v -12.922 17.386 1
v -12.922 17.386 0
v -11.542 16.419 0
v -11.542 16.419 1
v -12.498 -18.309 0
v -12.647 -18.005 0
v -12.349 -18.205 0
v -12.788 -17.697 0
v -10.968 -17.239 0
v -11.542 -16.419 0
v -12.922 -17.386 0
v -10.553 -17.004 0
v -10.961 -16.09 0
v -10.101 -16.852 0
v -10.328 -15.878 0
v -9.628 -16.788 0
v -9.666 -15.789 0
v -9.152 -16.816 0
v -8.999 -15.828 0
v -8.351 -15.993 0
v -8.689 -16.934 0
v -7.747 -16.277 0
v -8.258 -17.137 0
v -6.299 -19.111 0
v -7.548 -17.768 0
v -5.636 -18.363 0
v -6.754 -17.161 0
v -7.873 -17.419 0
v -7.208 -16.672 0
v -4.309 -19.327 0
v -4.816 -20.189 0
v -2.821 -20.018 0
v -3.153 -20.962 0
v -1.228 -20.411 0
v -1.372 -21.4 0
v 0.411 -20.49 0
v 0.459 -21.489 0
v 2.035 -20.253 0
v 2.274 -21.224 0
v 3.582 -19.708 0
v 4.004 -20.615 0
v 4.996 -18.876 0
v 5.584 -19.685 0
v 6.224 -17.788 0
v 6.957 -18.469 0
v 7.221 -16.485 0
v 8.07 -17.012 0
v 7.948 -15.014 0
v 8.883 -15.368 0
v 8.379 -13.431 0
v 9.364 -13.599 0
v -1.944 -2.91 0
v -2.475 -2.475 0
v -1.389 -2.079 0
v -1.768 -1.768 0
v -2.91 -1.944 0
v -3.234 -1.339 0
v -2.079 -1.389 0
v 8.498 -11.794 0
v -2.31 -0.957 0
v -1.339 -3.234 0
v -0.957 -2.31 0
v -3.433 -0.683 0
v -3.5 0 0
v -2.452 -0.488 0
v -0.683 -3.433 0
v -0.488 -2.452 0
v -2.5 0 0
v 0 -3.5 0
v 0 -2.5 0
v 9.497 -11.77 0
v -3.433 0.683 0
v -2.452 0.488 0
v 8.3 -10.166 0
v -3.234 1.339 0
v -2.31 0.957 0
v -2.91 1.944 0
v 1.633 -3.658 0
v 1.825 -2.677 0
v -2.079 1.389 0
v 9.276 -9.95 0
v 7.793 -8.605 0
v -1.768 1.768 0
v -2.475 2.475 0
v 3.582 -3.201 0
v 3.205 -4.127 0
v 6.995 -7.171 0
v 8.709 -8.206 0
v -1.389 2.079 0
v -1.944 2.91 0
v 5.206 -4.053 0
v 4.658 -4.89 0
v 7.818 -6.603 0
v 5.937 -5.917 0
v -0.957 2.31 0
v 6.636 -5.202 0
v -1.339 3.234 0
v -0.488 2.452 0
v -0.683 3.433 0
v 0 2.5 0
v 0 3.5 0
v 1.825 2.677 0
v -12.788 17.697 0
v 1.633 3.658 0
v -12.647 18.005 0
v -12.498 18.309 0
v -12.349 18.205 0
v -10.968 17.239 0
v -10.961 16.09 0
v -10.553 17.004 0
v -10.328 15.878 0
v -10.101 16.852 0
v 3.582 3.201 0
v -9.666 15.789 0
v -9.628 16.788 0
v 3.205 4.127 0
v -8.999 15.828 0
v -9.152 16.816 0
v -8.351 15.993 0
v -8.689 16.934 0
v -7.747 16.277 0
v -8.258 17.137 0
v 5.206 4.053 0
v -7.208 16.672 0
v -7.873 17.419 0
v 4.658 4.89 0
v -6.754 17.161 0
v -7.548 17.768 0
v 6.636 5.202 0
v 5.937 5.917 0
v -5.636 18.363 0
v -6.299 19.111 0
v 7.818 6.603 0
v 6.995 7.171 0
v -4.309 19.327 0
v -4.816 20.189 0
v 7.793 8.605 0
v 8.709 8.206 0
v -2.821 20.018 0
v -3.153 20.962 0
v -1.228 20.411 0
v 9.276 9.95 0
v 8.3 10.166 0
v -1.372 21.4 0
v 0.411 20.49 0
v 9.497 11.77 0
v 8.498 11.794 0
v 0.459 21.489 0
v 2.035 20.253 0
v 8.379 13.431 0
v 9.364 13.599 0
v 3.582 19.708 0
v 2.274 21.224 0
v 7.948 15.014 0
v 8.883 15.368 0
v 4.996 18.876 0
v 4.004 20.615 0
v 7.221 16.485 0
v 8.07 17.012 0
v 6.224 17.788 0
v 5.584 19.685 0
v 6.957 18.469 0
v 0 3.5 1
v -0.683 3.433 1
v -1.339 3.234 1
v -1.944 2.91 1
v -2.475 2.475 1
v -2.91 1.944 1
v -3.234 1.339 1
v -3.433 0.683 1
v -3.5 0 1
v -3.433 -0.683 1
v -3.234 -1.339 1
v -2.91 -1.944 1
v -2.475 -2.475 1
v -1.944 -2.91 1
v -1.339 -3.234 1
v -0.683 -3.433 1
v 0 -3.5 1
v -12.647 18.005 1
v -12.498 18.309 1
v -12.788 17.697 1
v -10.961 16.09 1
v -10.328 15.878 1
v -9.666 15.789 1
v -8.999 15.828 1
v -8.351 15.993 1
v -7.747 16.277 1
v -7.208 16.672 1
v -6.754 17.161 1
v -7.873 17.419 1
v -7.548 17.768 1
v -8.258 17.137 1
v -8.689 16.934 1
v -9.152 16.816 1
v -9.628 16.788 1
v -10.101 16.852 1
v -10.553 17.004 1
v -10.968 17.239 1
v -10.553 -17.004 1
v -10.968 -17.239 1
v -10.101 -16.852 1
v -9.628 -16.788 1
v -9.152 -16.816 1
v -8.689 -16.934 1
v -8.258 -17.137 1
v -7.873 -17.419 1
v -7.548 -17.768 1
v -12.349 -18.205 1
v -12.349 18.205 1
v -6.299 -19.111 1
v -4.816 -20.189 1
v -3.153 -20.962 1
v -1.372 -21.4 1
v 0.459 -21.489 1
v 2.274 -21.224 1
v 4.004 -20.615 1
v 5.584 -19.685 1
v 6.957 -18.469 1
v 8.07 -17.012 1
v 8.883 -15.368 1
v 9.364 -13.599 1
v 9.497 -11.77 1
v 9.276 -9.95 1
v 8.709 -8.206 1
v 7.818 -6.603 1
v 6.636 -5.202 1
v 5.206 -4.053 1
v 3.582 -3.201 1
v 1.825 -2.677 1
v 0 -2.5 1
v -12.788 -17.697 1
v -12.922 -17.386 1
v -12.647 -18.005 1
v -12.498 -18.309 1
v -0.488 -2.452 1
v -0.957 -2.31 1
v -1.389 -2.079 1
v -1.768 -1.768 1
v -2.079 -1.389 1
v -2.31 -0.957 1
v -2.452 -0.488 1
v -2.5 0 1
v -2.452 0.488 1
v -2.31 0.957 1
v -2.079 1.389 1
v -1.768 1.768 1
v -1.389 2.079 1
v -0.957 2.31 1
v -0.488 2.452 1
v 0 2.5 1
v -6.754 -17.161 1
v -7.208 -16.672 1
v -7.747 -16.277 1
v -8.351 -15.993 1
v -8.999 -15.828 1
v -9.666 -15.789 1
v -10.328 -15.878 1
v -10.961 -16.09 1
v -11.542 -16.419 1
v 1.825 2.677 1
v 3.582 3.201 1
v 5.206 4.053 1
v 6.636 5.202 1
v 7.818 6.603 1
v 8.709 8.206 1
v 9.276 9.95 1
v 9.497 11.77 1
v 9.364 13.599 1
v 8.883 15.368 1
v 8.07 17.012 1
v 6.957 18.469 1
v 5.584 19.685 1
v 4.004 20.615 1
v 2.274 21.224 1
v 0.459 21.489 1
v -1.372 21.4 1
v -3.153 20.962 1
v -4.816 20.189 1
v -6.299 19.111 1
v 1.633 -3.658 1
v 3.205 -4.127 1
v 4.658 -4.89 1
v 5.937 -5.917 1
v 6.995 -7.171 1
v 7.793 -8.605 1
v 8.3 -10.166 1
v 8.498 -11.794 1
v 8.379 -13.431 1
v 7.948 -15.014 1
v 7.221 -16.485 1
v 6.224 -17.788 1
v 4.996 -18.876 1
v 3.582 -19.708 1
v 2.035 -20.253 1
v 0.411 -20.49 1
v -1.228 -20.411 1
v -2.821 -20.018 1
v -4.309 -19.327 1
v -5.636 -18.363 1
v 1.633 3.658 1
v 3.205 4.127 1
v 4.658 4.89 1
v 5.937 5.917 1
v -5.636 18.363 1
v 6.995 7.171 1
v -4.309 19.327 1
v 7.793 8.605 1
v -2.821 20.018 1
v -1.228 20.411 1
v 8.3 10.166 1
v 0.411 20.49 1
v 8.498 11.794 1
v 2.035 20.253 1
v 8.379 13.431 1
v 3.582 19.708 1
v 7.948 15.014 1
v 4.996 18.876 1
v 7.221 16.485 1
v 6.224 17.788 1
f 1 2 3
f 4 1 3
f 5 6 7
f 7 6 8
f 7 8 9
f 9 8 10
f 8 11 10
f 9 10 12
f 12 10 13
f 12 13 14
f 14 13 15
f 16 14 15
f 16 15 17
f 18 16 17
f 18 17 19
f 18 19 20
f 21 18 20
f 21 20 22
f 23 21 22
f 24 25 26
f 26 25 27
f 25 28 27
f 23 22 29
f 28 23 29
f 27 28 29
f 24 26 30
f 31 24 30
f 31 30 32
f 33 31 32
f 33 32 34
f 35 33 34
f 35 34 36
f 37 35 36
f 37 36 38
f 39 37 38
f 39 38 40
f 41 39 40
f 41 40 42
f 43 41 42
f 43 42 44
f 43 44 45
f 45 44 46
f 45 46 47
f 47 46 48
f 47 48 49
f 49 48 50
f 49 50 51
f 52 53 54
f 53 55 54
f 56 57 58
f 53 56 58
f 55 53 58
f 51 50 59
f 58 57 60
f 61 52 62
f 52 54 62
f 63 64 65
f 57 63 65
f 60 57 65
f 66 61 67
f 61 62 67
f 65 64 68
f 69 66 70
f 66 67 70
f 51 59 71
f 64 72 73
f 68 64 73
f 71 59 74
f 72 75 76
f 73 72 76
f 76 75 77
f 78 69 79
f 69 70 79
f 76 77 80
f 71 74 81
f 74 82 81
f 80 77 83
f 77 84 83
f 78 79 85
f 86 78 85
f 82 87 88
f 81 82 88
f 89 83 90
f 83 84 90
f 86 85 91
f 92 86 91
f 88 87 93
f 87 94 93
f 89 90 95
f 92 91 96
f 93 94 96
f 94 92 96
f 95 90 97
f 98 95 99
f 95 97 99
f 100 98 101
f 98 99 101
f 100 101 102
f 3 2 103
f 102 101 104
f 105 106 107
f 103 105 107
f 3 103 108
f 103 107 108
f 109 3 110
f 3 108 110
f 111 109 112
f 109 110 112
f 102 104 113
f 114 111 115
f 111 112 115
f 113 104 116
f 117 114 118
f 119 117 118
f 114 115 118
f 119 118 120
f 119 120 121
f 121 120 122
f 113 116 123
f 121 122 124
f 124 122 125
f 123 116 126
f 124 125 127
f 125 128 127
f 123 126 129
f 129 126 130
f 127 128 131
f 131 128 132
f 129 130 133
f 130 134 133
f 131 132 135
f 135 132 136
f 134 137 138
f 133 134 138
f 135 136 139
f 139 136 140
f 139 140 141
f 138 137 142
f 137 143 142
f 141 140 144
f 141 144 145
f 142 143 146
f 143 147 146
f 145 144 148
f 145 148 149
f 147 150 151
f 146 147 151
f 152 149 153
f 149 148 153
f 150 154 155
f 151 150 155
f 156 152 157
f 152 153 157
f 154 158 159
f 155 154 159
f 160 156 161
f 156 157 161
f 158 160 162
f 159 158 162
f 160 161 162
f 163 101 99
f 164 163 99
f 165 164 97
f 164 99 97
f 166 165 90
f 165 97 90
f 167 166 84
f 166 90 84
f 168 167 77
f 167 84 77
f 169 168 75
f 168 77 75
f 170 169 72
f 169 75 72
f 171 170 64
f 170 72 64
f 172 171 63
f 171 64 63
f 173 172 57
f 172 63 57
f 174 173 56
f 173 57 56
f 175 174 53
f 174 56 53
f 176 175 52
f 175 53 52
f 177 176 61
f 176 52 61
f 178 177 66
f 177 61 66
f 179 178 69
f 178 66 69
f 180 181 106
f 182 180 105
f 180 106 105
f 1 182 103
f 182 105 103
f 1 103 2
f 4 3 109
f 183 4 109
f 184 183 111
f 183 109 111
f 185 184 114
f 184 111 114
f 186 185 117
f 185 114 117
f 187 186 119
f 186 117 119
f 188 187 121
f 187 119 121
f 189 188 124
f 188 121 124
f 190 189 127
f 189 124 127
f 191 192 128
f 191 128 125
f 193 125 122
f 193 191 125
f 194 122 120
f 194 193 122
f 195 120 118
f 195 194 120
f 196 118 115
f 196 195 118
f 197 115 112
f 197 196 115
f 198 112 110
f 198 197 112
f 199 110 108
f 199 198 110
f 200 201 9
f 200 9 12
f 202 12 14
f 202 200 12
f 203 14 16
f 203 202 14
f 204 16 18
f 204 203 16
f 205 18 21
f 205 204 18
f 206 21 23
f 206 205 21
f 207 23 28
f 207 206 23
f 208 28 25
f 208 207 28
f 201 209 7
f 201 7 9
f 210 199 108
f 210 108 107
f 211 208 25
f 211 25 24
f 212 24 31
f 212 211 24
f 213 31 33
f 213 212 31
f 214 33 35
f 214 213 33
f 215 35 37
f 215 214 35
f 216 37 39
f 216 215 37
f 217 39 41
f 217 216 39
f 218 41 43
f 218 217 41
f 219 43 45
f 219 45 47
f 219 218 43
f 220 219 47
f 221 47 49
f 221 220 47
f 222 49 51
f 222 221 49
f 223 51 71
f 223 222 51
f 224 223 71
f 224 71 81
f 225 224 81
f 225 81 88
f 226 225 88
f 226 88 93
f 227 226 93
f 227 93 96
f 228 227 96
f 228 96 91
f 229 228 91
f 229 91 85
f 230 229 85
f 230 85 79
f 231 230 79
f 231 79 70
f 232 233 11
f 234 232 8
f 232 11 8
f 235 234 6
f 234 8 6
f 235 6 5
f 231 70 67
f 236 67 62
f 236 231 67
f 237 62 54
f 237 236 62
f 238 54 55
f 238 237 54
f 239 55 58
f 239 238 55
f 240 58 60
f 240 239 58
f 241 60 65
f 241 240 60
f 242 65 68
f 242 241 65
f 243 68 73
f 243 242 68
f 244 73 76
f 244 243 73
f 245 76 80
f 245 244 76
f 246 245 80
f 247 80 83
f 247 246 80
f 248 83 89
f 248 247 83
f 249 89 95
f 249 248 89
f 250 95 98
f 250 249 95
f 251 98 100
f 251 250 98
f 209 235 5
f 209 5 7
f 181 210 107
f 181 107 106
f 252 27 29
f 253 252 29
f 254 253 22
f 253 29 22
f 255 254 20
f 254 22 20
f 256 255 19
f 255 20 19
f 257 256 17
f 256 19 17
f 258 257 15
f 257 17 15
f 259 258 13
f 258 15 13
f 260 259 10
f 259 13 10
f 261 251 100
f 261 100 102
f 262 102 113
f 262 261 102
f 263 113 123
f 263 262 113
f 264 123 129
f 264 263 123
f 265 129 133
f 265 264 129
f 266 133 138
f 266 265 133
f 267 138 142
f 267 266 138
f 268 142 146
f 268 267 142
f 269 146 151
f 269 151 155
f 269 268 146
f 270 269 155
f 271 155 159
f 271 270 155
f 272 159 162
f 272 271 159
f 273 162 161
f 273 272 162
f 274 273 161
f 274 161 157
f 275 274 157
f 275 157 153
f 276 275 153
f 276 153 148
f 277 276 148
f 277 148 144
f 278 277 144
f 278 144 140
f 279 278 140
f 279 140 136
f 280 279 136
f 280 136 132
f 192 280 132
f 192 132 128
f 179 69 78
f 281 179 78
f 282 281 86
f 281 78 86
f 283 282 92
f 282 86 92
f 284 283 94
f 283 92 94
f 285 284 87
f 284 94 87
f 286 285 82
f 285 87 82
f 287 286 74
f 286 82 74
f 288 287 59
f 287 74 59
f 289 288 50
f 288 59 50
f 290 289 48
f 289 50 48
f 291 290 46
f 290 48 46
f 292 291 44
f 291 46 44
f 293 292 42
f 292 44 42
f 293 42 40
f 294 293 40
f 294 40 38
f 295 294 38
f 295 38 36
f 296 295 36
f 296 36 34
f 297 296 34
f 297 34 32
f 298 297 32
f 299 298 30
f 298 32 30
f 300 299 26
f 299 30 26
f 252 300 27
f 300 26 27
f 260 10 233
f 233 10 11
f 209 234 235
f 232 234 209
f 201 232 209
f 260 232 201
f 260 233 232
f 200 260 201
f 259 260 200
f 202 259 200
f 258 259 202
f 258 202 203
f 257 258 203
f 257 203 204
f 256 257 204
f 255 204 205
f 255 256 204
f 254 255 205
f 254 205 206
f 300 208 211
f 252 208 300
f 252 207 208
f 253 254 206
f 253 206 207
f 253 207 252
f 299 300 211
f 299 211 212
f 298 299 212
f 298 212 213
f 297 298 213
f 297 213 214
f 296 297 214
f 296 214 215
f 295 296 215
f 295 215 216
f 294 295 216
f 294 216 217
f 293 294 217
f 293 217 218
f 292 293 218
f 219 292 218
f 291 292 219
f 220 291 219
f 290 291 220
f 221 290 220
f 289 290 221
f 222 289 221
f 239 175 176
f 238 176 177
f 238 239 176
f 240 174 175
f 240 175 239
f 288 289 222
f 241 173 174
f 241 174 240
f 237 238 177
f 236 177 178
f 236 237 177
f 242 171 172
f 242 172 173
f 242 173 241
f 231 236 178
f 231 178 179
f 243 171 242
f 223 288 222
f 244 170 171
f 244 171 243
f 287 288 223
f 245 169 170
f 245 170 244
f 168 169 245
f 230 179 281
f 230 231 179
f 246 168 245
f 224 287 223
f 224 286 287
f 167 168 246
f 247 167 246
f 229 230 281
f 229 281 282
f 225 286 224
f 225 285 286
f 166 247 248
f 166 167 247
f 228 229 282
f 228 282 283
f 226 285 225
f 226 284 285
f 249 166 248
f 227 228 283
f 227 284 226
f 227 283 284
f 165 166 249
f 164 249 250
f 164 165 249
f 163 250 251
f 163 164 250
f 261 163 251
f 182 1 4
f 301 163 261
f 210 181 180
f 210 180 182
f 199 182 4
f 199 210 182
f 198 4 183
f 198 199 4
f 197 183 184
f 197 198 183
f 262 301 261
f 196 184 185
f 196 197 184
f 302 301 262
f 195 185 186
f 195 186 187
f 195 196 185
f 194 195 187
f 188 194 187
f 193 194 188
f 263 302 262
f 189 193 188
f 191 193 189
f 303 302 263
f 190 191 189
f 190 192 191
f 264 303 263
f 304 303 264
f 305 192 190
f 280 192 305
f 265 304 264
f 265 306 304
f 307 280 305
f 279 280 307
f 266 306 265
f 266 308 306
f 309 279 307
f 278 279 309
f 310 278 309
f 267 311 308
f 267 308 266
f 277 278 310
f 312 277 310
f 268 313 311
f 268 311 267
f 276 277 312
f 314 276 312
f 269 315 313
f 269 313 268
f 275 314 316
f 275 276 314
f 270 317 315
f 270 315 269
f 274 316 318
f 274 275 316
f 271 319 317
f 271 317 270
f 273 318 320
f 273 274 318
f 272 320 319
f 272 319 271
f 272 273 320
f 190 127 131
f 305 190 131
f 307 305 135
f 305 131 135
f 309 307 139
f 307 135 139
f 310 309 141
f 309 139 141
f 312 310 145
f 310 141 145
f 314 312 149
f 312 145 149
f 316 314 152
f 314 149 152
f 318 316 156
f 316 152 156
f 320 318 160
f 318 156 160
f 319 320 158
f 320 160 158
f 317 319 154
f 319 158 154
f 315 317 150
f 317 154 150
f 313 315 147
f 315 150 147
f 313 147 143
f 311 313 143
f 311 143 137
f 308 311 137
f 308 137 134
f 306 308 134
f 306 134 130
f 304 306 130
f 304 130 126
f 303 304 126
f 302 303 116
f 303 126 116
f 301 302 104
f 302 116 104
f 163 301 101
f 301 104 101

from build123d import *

# Parameters (mm, degrees)
BOSS_EXTRU_2_DEPTH      = 1
ESQUISSE2_OUTSIDE_W     = 37.018
ESQUISSE2_OUTSIDE_H     = 59.596
ENL_V_MAT_EXTRU_1_DEPTH = 27.837289407


with BuildPart() as part:
    # Esquisse1 → Boss.-Extru.2 (new body)
    with BuildSketch(Plane.XY):
        with BuildLine():
            Line((-12.922465041, 17.386083667), (-11.5420173, 16.419483753))
            ThreePointArc((-11.5420173, 16.419483753), (-8.998687611, 15.827772592), (-6.753604006, 17.161282102))
            ThreePointArc((-6.753604006, 17.161282102), (7.619740739, 15.766902052), (0, 3.5))
            ThreePointArc((0, 3.5), (-3.5, 0), (0, -3.5))
            ThreePointArc((0, -3.5), (7.619740739, -15.766902052), (-6.753604006, -17.161282102))
            ThreePointArc((-6.753604006, -17.161282102), (-8.998687611, -15.827772592), (-11.5420173, -16.419483753))
            Line((-11.5420173, -16.419483753), (-12.922465041, -17.386083667))
            ThreePointArc((-12.922465041, -17.386083667), (-12.266740841, -18.747374982), (-11.46812862, -20.030070109))
            Line((-11.46812862, -20.030070109), (-9.821287991, -18.876939886))
            ThreePointArc((-9.821287991, -18.876939886), (-9.457955178, -18.79240972), (-9.137228949, -18.982911079))
            ThreePointArc((-9.137228949, -18.982911079), (10.309061, -17.096396894), (0, -0.5))
            ThreePointArc((0, -0.5), (-0.5, 0), (0, 0.5))
            ThreePointArc((0, 0.5), (10.309061, 17.096396894), (-9.137228949, 18.982911079))
            ThreePointArc((-9.137228949, 18.982911079), (-9.457955178, 18.79240972), (-9.821287991, 18.876939886))
            Line((-9.821287991, 18.876939886), (-11.46812862, 20.030070109))
            ThreePointArc((-11.46812862, 20.030070109), (-12.266740841, 18.747374982), (-12.922465041, 17.386083667))
        make_face()
    extrude(amount=BOSS_EXTRU_2_DEPTH)

    # Esquisse2 outside → Enlèv. mat.-Extru.1 (cut, through all)
    with BuildSketch(Plane.XY.offset(1)):
        with Locations((-0.711, 0)):
            Rectangle(ESQUISSE2_OUTSIDE_W, ESQUISSE2_OUTSIDE_H)
        with BuildLine():
            Line((-12.922465041, 17.386083667), (-11.5420173, 16.419483753))
            ThreePointArc((-11.5420173, 16.419483753), (-8.998687611, 15.827772592), (-6.753604006, 17.161282102))
            ThreePointArc((-6.753604006, 17.161282102), (7.619740739, 15.766902052), (0, 3.5))
            ThreePointArc((0, 3.5), (-3.5, 0), (0, -3.5))
            ThreePointArc((0, -3.5), (7.619740739, -15.766902052), (-6.753604006, -17.161282102))
            ThreePointArc((-6.753604006, -17.161282102), (-8.998687611, -15.827772592), (-11.5420173, -16.419483753))
            Line((-11.5420173, -16.419483753), (-12.922465041, -17.386083667))
            Line((-12.922465041, -17.386083667), (-12.979954825, -18.647113037))
            Line((-12.979954825, -18.647113037), (-12.348888604, -18.205235712))
            Line((-12.348888604, -18.205235712), (-10.968440864, -17.238635798))
            ThreePointArc((-10.968440864, -17.238635798), (-9.1517768, -16.815984968), (-7.548145653, -17.768491761))
            ThreePointArc((-7.548145653, -17.768491761), (8.516180826, -16.210066999), (0, -2.5))
            ThreePointArc((0, -2.5), (-2.5, 0), (0, 2.5))
            ThreePointArc((0, 2.5), (8.516180826, 16.210066999), (-7.548145653, 17.768491761))
            ThreePointArc((-7.548145653, 17.768491761), (-9.1517768, 16.815984968), (-10.968440864, 17.238635798))
            Line((-10.968440864, 17.238635798), (-12.348888604, 18.205235712))
            Line((-12.348888604, 18.205235712), (-12.898926694, 18.590376529))
            Line((-12.898926694, 18.590376529), (-13.29562882, 18.205235712))
            Line((-13.29562882, 18.205235712), (-12.922465041, 17.386083667))
        make_face(mode=Mode.SUBTRACT)
    extrude(amount=-ENL_V_MAT_EXTRU_1_DEPTH, mode=Mode.SUBTRACT)


solid = part.part
